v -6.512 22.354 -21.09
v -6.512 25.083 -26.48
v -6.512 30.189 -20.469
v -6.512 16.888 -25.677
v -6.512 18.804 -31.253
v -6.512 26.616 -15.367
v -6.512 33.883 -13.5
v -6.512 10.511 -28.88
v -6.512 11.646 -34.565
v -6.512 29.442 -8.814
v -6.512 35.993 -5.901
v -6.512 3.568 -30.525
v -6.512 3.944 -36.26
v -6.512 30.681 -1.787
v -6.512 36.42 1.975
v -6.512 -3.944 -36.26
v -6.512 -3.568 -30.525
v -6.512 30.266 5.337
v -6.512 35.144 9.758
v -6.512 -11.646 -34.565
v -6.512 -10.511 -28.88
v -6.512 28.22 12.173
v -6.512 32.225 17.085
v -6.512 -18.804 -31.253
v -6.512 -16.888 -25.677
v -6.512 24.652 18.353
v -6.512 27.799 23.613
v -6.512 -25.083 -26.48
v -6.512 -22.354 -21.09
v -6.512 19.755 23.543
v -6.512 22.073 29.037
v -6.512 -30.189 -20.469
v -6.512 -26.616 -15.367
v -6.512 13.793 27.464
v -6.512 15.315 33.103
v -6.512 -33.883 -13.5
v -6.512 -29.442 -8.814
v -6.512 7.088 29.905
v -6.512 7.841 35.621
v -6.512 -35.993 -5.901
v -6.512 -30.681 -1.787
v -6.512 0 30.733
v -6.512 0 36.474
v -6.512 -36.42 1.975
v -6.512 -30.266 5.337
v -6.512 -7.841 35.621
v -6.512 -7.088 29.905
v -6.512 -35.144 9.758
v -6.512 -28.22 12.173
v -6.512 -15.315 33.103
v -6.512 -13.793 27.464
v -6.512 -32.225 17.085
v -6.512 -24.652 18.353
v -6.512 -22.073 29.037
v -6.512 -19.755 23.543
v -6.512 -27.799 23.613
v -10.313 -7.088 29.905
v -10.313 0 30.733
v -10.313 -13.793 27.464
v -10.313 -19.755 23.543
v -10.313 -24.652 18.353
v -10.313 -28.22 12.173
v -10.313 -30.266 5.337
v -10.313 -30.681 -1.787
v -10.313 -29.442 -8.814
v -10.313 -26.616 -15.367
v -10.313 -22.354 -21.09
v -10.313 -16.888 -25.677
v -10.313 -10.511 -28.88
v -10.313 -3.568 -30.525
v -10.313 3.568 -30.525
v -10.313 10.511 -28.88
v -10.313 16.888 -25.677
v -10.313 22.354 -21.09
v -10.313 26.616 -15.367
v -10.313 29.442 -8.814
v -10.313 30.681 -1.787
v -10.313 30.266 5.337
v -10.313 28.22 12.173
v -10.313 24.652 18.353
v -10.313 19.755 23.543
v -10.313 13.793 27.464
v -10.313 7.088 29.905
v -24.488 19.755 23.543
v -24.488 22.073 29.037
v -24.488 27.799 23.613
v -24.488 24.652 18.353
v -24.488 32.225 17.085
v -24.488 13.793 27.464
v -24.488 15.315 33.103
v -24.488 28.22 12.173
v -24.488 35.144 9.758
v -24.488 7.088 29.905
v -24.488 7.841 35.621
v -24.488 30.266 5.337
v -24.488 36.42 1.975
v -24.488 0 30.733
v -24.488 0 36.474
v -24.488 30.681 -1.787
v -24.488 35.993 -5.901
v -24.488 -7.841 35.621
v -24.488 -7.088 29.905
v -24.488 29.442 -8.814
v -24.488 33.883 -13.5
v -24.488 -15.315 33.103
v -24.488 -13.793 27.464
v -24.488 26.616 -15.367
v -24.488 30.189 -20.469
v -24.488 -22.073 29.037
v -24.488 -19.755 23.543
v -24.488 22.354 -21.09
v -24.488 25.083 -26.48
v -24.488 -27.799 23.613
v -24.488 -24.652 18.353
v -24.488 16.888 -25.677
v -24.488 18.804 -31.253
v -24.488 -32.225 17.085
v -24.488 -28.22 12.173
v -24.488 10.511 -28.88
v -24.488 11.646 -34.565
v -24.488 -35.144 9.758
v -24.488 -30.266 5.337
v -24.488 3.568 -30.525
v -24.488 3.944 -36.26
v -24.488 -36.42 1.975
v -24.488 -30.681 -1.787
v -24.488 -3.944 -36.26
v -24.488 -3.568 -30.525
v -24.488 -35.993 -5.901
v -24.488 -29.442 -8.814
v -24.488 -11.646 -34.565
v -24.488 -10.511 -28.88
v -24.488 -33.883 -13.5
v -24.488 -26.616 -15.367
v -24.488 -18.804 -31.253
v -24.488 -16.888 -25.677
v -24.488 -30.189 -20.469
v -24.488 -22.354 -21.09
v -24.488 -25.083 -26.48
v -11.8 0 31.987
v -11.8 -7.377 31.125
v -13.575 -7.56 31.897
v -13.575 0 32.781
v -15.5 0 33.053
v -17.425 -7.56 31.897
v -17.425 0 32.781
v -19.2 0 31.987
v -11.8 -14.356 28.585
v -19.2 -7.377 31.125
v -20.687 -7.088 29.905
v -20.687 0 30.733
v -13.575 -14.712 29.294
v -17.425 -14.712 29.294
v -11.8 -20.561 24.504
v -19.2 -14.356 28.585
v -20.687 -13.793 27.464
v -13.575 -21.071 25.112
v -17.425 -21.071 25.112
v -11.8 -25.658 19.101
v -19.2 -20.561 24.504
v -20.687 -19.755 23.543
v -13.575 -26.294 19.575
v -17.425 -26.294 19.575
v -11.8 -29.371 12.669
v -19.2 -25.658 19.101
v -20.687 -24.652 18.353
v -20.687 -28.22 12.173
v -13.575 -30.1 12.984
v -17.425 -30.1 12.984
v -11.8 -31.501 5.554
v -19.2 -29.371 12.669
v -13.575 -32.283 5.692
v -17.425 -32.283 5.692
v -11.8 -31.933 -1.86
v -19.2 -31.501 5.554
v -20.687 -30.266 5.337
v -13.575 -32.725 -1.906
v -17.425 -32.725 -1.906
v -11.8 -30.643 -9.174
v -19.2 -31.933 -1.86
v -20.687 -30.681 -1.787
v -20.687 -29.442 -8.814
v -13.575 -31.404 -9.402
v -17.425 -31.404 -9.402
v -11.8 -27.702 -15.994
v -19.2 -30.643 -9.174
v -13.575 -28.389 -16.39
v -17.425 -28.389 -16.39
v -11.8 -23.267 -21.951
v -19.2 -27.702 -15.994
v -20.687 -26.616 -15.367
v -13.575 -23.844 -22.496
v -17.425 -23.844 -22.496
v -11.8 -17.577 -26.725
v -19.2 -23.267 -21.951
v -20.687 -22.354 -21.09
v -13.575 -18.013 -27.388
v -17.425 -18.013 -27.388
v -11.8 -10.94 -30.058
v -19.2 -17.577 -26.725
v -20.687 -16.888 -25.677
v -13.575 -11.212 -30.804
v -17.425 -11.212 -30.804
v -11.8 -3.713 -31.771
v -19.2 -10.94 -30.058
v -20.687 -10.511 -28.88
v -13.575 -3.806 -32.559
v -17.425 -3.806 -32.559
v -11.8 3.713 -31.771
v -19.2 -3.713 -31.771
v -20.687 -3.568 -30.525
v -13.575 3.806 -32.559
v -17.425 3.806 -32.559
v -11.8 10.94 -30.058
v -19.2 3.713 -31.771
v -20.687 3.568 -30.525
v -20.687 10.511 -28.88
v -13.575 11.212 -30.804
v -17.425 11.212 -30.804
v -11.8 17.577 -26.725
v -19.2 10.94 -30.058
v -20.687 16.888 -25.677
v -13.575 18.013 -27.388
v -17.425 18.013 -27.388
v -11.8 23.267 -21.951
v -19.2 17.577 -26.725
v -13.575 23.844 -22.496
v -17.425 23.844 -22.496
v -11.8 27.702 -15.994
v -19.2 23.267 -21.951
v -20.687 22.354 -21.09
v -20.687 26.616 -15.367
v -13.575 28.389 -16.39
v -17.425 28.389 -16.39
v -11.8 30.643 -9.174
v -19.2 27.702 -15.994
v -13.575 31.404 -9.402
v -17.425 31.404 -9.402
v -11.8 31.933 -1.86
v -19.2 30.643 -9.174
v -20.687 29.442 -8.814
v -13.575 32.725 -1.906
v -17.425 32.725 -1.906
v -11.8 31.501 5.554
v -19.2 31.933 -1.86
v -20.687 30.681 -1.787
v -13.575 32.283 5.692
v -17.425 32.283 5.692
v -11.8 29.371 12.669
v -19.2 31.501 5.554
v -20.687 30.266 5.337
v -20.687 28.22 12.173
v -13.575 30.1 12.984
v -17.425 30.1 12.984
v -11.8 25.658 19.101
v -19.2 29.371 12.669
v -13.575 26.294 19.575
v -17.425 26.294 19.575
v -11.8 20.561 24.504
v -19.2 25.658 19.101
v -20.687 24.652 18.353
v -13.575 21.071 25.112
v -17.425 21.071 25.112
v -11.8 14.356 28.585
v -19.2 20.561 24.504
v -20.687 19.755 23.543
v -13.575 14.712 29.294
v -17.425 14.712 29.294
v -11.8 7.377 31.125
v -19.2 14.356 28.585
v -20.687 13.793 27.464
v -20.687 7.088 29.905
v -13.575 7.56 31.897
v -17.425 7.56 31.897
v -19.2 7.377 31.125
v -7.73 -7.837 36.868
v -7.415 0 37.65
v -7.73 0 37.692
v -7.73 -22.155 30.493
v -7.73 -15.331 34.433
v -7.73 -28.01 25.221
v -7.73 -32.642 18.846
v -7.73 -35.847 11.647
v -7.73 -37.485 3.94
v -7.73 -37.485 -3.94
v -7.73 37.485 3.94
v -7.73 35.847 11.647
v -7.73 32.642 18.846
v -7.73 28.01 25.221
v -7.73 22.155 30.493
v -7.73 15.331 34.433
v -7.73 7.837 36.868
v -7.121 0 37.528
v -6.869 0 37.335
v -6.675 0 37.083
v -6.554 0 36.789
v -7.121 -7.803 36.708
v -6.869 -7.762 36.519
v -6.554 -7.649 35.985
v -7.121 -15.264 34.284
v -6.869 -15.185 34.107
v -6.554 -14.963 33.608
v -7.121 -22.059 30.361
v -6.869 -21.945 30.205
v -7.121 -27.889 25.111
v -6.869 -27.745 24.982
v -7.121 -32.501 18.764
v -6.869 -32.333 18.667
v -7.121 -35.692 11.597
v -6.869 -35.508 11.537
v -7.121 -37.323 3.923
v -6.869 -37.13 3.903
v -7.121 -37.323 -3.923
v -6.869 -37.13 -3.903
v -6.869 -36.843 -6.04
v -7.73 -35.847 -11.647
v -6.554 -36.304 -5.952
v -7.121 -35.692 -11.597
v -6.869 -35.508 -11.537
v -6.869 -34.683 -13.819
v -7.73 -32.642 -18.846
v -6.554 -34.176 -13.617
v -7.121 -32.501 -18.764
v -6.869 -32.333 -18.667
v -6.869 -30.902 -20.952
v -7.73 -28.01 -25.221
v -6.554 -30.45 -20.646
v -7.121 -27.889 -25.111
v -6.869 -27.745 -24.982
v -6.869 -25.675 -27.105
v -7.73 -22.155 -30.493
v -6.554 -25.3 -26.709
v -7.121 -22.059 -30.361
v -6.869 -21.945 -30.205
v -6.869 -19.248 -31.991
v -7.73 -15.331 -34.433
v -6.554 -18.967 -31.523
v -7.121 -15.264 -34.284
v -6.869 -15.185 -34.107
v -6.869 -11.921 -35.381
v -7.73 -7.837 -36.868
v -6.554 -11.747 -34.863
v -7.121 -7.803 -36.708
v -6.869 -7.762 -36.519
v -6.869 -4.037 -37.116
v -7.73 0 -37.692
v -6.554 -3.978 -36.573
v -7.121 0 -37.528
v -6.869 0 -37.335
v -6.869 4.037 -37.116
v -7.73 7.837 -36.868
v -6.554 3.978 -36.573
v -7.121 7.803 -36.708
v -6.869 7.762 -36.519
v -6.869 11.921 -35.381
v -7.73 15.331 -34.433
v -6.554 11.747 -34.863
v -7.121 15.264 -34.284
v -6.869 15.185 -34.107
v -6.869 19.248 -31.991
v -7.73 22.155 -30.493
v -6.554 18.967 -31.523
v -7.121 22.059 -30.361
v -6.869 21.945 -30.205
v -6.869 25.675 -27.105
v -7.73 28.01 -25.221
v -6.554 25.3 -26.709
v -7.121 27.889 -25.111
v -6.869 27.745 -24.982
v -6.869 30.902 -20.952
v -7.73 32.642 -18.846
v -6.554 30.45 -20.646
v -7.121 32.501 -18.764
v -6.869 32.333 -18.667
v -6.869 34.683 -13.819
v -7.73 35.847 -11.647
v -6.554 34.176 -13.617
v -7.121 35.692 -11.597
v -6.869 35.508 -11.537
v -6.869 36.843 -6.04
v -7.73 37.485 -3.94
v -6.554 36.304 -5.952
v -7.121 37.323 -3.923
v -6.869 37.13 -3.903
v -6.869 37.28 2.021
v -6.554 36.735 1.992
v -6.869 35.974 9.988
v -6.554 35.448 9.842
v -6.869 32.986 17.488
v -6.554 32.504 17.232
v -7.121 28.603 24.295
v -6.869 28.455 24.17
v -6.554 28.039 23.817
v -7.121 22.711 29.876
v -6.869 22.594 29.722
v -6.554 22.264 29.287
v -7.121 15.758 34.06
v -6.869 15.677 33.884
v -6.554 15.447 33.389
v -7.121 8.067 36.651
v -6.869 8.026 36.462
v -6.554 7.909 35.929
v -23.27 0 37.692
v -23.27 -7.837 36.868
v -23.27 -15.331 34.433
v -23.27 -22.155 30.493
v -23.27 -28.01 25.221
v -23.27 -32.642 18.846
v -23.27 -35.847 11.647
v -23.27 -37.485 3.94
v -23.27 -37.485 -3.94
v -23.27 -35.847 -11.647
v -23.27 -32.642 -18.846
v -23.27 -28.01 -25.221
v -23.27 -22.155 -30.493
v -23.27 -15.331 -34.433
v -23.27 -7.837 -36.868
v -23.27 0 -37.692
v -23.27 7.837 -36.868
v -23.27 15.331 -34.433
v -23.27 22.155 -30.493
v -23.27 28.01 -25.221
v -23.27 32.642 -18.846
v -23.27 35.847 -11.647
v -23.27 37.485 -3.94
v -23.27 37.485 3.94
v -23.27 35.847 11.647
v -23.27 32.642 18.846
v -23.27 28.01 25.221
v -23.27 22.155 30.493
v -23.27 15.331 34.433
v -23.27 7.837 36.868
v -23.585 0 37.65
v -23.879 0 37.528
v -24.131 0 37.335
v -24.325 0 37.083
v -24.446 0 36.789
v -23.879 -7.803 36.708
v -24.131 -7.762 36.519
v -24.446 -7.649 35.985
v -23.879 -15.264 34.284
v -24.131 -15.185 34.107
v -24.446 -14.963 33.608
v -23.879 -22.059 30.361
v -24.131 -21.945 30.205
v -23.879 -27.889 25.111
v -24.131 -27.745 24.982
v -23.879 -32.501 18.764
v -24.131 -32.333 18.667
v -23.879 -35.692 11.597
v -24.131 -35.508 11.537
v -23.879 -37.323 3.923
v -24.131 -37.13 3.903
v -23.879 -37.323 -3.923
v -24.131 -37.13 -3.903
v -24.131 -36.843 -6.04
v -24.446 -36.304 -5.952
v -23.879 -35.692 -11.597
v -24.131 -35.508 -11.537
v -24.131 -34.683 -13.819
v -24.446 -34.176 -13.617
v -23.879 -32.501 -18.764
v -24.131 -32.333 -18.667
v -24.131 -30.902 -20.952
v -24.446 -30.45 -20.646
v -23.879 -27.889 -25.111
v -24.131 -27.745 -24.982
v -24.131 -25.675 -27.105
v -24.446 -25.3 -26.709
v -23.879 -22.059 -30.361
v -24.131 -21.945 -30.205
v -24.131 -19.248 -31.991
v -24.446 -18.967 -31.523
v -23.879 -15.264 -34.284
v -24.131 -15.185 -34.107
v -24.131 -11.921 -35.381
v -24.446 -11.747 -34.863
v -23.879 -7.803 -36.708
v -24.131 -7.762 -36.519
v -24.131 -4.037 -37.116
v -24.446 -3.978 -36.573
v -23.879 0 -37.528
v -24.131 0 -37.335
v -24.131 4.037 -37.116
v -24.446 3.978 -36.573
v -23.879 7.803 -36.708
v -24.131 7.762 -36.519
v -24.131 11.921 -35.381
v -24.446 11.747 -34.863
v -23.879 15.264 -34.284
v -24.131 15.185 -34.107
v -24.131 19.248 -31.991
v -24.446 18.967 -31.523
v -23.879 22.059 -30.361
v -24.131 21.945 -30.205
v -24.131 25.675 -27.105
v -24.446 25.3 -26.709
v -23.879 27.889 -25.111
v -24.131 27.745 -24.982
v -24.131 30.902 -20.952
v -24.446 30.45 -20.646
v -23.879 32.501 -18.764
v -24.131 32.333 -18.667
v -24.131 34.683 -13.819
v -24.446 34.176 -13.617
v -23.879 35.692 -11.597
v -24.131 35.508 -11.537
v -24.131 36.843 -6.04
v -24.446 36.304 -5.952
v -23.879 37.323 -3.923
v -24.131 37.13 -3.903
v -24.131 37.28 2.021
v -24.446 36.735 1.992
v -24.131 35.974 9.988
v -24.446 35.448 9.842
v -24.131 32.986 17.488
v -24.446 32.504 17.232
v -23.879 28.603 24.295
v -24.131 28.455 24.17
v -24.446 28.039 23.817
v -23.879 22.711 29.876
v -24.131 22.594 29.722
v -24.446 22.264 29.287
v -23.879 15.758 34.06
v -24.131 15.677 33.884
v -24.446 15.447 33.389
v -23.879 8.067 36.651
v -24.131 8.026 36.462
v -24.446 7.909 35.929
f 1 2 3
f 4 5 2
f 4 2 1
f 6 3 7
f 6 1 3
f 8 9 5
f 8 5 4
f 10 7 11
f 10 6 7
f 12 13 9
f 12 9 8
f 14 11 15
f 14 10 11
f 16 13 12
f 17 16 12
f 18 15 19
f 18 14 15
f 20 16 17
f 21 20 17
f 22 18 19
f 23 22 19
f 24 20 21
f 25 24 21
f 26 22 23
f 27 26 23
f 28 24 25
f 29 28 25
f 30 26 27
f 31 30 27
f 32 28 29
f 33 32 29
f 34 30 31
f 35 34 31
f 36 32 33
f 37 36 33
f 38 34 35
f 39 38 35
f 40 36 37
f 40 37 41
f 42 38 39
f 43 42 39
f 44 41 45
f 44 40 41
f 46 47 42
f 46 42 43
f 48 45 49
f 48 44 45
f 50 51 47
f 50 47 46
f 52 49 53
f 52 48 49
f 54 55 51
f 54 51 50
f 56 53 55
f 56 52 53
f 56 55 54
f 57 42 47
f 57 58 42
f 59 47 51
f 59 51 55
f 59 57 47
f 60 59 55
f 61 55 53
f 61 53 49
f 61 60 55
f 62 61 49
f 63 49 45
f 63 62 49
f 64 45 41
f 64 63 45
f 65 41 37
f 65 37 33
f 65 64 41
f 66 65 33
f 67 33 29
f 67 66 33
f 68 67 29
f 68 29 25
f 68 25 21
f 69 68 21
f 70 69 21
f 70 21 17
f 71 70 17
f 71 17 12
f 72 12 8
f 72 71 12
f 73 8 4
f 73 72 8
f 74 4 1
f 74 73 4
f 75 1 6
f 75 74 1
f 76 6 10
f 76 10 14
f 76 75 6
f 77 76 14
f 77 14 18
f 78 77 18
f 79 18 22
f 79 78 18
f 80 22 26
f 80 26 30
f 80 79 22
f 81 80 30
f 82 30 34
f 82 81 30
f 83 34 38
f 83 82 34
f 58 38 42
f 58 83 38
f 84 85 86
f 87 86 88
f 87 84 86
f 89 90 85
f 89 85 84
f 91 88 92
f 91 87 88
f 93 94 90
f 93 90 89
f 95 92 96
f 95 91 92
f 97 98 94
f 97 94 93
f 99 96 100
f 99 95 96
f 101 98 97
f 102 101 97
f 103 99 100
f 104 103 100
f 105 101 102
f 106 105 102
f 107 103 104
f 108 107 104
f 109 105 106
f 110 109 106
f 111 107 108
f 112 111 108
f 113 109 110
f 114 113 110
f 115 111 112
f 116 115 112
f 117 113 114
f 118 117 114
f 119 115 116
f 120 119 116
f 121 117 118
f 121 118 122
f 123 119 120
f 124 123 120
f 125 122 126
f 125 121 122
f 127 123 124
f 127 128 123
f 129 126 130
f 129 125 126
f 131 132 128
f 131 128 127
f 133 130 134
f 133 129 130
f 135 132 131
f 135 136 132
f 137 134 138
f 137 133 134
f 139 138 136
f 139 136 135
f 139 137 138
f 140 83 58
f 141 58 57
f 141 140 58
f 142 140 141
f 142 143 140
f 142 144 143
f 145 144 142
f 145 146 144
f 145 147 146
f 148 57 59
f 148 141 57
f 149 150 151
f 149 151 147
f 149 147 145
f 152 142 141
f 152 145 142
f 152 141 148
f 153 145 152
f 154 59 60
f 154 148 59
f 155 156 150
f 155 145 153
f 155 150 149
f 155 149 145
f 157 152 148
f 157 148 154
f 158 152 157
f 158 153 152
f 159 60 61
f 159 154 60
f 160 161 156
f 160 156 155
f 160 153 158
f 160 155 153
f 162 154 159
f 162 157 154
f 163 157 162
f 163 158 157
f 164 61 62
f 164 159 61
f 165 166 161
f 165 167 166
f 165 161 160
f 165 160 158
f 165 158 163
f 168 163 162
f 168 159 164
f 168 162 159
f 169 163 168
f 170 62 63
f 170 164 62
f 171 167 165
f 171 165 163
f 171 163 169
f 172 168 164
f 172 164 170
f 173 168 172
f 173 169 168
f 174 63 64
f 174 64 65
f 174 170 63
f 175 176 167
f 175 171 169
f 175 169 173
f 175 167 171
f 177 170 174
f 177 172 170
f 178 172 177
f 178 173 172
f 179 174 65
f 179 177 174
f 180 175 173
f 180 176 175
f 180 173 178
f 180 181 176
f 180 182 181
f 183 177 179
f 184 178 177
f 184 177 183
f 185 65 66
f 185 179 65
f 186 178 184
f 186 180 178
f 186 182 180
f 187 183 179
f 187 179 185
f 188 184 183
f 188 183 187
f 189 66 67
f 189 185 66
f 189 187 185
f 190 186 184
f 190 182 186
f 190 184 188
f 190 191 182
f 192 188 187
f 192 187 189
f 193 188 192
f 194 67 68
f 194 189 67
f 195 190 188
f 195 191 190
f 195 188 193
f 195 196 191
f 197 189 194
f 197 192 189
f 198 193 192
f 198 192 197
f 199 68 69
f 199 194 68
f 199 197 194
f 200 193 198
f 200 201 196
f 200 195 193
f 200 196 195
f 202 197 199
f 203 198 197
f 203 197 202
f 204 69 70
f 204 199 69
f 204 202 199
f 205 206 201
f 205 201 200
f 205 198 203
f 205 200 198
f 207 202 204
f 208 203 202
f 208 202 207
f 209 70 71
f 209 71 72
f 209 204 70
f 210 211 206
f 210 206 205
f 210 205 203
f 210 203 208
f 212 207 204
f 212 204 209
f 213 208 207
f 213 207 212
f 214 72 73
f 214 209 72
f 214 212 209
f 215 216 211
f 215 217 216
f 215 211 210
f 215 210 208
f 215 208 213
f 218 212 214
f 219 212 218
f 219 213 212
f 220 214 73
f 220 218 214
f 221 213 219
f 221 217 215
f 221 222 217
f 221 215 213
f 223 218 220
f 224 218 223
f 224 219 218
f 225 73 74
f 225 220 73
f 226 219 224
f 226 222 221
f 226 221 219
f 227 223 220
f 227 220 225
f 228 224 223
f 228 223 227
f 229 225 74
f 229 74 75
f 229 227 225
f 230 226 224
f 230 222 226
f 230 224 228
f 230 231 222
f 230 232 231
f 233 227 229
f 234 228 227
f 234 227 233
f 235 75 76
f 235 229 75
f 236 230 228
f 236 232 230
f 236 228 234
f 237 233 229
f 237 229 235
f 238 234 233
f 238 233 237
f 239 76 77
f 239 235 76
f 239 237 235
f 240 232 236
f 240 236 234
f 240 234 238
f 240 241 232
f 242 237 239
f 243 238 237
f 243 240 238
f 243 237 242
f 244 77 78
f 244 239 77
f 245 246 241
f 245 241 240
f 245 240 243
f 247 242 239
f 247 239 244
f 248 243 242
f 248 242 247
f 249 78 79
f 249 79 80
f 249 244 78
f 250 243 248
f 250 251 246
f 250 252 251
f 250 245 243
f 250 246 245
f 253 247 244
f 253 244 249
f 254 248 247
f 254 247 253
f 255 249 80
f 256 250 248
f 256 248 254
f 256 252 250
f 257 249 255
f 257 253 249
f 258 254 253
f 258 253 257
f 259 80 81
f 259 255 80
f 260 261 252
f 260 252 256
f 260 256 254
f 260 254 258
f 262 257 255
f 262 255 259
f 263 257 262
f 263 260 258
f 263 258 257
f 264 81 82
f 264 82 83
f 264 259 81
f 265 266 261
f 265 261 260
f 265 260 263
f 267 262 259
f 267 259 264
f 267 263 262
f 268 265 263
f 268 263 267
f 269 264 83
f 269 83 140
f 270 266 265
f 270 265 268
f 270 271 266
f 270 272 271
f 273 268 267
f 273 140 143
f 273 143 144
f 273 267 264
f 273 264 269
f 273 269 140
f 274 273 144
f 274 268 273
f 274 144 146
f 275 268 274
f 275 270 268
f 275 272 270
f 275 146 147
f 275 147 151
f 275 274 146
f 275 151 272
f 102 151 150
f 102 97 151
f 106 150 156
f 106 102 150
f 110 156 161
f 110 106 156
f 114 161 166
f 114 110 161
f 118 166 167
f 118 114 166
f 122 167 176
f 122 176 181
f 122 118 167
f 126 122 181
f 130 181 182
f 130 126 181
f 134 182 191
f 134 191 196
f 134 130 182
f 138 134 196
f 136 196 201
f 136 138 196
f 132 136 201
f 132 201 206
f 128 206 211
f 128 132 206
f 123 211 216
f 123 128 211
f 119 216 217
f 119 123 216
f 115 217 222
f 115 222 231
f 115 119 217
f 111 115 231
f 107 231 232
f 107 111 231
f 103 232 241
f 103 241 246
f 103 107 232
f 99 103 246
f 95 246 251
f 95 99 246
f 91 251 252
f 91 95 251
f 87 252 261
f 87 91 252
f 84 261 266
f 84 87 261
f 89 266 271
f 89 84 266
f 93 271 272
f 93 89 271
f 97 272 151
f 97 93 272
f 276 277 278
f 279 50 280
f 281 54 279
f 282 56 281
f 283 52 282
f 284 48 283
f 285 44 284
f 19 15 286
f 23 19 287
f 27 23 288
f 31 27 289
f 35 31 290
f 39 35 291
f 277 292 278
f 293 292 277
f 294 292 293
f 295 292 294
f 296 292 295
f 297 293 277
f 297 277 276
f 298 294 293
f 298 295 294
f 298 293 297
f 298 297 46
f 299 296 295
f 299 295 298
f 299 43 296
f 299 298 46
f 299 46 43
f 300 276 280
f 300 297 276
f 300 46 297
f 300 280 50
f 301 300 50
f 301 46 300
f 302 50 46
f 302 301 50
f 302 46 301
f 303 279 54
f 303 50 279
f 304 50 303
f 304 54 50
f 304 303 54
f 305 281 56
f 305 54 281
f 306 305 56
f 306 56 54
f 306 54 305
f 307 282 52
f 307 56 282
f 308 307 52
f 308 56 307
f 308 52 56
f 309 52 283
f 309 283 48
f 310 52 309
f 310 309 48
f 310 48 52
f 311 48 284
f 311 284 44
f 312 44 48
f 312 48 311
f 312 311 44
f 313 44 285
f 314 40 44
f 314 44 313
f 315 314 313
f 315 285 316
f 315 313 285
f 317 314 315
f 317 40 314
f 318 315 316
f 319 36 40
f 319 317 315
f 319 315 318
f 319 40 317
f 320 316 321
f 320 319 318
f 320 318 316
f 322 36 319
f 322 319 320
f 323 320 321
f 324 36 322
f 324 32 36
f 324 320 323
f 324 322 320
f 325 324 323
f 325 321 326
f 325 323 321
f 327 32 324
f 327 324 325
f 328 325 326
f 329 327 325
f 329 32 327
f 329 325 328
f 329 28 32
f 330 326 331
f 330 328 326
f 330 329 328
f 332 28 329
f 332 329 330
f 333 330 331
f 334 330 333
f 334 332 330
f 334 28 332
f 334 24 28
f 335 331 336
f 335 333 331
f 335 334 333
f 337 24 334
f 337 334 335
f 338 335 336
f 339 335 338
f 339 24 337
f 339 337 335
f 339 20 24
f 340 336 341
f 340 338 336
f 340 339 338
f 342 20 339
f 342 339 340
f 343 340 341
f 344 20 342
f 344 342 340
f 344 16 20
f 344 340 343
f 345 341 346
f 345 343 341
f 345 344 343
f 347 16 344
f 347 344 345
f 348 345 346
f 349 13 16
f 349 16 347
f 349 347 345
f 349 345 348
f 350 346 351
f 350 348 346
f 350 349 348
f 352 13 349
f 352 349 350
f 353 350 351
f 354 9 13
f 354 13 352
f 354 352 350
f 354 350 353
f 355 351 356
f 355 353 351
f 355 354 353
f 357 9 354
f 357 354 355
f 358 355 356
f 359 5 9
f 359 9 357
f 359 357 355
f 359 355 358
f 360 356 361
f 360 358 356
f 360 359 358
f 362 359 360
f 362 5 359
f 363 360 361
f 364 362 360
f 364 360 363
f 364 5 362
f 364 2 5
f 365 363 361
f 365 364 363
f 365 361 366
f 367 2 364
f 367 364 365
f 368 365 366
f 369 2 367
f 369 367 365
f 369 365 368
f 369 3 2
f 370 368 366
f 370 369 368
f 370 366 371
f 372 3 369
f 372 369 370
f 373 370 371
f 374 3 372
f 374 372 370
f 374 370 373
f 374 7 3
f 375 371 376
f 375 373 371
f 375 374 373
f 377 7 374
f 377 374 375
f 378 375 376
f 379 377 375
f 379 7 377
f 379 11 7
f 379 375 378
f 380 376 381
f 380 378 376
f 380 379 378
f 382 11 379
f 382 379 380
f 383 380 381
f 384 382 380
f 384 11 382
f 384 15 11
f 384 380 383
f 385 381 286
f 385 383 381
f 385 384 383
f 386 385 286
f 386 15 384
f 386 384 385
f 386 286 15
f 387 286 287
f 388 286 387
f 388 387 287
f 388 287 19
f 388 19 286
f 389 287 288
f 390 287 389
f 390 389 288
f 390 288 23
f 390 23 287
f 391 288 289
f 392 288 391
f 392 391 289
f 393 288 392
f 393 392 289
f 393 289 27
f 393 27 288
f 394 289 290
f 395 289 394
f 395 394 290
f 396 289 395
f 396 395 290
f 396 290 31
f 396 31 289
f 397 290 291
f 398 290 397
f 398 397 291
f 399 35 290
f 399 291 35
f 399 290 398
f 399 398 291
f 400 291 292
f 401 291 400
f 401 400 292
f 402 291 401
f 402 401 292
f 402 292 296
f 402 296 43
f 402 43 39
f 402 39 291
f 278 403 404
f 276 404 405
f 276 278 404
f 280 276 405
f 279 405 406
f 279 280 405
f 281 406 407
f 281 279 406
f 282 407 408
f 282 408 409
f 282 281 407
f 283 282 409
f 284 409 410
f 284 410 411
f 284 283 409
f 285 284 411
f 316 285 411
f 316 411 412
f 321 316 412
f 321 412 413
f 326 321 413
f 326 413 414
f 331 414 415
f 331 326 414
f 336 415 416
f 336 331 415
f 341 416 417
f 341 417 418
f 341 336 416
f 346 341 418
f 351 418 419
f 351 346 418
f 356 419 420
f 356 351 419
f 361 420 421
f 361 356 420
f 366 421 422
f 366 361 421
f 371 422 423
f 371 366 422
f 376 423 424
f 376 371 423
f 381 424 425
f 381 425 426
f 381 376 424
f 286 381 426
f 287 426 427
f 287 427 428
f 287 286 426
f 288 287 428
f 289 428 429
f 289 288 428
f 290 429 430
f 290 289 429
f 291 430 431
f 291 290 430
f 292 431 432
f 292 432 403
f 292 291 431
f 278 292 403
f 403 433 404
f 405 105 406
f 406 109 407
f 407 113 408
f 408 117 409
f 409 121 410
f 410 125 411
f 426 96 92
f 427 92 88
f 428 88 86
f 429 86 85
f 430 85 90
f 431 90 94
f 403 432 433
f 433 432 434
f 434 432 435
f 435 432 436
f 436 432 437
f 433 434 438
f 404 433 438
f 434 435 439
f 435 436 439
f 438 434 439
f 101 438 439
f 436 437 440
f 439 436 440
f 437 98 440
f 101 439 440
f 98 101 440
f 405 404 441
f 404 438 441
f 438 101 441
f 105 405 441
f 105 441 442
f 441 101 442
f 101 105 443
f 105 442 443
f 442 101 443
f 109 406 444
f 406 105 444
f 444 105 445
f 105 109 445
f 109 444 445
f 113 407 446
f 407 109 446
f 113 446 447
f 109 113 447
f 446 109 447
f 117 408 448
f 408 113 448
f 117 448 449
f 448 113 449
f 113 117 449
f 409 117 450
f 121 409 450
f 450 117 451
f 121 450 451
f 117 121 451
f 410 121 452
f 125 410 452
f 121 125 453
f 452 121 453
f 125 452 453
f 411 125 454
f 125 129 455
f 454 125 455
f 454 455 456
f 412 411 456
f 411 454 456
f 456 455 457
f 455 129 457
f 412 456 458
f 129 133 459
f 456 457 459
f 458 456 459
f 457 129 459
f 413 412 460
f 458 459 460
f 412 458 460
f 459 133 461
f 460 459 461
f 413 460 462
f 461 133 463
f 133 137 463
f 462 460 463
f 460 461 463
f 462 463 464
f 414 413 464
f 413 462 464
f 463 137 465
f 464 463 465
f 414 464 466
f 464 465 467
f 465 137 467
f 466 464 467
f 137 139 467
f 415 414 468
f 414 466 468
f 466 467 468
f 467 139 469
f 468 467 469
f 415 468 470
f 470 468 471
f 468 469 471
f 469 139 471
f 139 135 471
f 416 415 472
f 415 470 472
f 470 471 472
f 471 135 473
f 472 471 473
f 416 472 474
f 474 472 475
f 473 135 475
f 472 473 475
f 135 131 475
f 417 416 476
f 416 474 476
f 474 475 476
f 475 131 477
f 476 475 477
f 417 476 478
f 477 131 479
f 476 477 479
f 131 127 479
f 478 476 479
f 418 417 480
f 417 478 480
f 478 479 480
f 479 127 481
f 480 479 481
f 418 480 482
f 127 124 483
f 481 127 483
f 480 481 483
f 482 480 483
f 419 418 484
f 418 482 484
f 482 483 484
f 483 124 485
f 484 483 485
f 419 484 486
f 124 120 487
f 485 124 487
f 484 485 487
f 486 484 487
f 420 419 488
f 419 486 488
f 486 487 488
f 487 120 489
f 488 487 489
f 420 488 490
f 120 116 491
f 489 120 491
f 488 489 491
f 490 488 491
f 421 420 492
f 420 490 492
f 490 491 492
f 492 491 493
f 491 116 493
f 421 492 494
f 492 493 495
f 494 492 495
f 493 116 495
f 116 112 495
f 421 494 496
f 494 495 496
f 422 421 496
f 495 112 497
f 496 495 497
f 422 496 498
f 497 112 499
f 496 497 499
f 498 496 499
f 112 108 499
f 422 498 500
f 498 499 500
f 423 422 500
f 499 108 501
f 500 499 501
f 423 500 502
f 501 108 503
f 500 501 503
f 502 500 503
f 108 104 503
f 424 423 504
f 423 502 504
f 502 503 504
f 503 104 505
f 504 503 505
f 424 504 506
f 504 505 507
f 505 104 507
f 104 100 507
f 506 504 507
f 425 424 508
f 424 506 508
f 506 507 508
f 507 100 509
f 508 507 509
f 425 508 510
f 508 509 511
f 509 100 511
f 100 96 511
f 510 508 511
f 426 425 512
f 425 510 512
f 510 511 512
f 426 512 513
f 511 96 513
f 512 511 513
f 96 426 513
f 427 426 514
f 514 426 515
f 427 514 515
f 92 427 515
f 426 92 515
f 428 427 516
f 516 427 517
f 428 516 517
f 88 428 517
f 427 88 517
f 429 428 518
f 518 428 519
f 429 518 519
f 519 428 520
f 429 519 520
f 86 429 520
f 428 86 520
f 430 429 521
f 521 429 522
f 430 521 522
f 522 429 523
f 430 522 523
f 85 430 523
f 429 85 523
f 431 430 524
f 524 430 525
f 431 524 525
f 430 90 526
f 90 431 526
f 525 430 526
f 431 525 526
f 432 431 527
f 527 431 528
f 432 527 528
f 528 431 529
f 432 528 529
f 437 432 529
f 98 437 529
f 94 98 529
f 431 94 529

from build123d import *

# Parameters (mm, degrees)
FILLET1_R    = 2.1
SCALE1_SCALE = 0.2
SCALE2_SCALE = 1.9329
SCALE3_SCALE = 1.5


with BuildPart() as part:
    # Sketch1 → Revolve1 (revolve)
    with BuildSketch(Plane.XY, mode=Mode.PRIVATE) as revolve1_sk:
        with BuildLine():
            Line((-31, 65), (0, 65))
            Line((0, 65), (0, 53))
            Line((0, 53), (-6.55572809, 53))
            ThreePointArc((-6.55572809, 53), (-15.5, 57), (-24.44427191, 53))
            Line((-24.44427191, 53), (-31, 53))
            Line((-31, 53), (-31, 65))
        make_face()
    revolve(revolve1_sk.sketch.rotate(Axis((-28.722748815, 0, 0), (1, 0, 0)), 90), axis=Axis((-28.722748815, 0, 0), (1, 0, 0)))

    # Fillet1
    fillet1_edges = [part.edges().sort_by_distance(p)[0] for p in [
        (-31, 0, -65),
        (0, 0, -65),
    ]]
    fillet(fillet1_edges, radius=FILLET1_R)


with BuildPart() as part_1:
    # Scale1: scaled about (-15.5, 0, 0)
    add(part.part.scale(SCALE1_SCALE).moved(Location((-12.4, 0, 0))))


with BuildPart() as part_2:
    # Scale2: scaled about (-15.5, 0, 0)
    add(part_1.part.scale(SCALE2_SCALE).moved(Location((14.45995, 0, 0))))


with BuildPart() as part_3:
    # Scale3: scaled about (-15.5, 0, 0)
    add(part_2.part.scale(SCALE3_SCALE).moved(Location((7.75, 0, 0))))


solid = part_3.part
